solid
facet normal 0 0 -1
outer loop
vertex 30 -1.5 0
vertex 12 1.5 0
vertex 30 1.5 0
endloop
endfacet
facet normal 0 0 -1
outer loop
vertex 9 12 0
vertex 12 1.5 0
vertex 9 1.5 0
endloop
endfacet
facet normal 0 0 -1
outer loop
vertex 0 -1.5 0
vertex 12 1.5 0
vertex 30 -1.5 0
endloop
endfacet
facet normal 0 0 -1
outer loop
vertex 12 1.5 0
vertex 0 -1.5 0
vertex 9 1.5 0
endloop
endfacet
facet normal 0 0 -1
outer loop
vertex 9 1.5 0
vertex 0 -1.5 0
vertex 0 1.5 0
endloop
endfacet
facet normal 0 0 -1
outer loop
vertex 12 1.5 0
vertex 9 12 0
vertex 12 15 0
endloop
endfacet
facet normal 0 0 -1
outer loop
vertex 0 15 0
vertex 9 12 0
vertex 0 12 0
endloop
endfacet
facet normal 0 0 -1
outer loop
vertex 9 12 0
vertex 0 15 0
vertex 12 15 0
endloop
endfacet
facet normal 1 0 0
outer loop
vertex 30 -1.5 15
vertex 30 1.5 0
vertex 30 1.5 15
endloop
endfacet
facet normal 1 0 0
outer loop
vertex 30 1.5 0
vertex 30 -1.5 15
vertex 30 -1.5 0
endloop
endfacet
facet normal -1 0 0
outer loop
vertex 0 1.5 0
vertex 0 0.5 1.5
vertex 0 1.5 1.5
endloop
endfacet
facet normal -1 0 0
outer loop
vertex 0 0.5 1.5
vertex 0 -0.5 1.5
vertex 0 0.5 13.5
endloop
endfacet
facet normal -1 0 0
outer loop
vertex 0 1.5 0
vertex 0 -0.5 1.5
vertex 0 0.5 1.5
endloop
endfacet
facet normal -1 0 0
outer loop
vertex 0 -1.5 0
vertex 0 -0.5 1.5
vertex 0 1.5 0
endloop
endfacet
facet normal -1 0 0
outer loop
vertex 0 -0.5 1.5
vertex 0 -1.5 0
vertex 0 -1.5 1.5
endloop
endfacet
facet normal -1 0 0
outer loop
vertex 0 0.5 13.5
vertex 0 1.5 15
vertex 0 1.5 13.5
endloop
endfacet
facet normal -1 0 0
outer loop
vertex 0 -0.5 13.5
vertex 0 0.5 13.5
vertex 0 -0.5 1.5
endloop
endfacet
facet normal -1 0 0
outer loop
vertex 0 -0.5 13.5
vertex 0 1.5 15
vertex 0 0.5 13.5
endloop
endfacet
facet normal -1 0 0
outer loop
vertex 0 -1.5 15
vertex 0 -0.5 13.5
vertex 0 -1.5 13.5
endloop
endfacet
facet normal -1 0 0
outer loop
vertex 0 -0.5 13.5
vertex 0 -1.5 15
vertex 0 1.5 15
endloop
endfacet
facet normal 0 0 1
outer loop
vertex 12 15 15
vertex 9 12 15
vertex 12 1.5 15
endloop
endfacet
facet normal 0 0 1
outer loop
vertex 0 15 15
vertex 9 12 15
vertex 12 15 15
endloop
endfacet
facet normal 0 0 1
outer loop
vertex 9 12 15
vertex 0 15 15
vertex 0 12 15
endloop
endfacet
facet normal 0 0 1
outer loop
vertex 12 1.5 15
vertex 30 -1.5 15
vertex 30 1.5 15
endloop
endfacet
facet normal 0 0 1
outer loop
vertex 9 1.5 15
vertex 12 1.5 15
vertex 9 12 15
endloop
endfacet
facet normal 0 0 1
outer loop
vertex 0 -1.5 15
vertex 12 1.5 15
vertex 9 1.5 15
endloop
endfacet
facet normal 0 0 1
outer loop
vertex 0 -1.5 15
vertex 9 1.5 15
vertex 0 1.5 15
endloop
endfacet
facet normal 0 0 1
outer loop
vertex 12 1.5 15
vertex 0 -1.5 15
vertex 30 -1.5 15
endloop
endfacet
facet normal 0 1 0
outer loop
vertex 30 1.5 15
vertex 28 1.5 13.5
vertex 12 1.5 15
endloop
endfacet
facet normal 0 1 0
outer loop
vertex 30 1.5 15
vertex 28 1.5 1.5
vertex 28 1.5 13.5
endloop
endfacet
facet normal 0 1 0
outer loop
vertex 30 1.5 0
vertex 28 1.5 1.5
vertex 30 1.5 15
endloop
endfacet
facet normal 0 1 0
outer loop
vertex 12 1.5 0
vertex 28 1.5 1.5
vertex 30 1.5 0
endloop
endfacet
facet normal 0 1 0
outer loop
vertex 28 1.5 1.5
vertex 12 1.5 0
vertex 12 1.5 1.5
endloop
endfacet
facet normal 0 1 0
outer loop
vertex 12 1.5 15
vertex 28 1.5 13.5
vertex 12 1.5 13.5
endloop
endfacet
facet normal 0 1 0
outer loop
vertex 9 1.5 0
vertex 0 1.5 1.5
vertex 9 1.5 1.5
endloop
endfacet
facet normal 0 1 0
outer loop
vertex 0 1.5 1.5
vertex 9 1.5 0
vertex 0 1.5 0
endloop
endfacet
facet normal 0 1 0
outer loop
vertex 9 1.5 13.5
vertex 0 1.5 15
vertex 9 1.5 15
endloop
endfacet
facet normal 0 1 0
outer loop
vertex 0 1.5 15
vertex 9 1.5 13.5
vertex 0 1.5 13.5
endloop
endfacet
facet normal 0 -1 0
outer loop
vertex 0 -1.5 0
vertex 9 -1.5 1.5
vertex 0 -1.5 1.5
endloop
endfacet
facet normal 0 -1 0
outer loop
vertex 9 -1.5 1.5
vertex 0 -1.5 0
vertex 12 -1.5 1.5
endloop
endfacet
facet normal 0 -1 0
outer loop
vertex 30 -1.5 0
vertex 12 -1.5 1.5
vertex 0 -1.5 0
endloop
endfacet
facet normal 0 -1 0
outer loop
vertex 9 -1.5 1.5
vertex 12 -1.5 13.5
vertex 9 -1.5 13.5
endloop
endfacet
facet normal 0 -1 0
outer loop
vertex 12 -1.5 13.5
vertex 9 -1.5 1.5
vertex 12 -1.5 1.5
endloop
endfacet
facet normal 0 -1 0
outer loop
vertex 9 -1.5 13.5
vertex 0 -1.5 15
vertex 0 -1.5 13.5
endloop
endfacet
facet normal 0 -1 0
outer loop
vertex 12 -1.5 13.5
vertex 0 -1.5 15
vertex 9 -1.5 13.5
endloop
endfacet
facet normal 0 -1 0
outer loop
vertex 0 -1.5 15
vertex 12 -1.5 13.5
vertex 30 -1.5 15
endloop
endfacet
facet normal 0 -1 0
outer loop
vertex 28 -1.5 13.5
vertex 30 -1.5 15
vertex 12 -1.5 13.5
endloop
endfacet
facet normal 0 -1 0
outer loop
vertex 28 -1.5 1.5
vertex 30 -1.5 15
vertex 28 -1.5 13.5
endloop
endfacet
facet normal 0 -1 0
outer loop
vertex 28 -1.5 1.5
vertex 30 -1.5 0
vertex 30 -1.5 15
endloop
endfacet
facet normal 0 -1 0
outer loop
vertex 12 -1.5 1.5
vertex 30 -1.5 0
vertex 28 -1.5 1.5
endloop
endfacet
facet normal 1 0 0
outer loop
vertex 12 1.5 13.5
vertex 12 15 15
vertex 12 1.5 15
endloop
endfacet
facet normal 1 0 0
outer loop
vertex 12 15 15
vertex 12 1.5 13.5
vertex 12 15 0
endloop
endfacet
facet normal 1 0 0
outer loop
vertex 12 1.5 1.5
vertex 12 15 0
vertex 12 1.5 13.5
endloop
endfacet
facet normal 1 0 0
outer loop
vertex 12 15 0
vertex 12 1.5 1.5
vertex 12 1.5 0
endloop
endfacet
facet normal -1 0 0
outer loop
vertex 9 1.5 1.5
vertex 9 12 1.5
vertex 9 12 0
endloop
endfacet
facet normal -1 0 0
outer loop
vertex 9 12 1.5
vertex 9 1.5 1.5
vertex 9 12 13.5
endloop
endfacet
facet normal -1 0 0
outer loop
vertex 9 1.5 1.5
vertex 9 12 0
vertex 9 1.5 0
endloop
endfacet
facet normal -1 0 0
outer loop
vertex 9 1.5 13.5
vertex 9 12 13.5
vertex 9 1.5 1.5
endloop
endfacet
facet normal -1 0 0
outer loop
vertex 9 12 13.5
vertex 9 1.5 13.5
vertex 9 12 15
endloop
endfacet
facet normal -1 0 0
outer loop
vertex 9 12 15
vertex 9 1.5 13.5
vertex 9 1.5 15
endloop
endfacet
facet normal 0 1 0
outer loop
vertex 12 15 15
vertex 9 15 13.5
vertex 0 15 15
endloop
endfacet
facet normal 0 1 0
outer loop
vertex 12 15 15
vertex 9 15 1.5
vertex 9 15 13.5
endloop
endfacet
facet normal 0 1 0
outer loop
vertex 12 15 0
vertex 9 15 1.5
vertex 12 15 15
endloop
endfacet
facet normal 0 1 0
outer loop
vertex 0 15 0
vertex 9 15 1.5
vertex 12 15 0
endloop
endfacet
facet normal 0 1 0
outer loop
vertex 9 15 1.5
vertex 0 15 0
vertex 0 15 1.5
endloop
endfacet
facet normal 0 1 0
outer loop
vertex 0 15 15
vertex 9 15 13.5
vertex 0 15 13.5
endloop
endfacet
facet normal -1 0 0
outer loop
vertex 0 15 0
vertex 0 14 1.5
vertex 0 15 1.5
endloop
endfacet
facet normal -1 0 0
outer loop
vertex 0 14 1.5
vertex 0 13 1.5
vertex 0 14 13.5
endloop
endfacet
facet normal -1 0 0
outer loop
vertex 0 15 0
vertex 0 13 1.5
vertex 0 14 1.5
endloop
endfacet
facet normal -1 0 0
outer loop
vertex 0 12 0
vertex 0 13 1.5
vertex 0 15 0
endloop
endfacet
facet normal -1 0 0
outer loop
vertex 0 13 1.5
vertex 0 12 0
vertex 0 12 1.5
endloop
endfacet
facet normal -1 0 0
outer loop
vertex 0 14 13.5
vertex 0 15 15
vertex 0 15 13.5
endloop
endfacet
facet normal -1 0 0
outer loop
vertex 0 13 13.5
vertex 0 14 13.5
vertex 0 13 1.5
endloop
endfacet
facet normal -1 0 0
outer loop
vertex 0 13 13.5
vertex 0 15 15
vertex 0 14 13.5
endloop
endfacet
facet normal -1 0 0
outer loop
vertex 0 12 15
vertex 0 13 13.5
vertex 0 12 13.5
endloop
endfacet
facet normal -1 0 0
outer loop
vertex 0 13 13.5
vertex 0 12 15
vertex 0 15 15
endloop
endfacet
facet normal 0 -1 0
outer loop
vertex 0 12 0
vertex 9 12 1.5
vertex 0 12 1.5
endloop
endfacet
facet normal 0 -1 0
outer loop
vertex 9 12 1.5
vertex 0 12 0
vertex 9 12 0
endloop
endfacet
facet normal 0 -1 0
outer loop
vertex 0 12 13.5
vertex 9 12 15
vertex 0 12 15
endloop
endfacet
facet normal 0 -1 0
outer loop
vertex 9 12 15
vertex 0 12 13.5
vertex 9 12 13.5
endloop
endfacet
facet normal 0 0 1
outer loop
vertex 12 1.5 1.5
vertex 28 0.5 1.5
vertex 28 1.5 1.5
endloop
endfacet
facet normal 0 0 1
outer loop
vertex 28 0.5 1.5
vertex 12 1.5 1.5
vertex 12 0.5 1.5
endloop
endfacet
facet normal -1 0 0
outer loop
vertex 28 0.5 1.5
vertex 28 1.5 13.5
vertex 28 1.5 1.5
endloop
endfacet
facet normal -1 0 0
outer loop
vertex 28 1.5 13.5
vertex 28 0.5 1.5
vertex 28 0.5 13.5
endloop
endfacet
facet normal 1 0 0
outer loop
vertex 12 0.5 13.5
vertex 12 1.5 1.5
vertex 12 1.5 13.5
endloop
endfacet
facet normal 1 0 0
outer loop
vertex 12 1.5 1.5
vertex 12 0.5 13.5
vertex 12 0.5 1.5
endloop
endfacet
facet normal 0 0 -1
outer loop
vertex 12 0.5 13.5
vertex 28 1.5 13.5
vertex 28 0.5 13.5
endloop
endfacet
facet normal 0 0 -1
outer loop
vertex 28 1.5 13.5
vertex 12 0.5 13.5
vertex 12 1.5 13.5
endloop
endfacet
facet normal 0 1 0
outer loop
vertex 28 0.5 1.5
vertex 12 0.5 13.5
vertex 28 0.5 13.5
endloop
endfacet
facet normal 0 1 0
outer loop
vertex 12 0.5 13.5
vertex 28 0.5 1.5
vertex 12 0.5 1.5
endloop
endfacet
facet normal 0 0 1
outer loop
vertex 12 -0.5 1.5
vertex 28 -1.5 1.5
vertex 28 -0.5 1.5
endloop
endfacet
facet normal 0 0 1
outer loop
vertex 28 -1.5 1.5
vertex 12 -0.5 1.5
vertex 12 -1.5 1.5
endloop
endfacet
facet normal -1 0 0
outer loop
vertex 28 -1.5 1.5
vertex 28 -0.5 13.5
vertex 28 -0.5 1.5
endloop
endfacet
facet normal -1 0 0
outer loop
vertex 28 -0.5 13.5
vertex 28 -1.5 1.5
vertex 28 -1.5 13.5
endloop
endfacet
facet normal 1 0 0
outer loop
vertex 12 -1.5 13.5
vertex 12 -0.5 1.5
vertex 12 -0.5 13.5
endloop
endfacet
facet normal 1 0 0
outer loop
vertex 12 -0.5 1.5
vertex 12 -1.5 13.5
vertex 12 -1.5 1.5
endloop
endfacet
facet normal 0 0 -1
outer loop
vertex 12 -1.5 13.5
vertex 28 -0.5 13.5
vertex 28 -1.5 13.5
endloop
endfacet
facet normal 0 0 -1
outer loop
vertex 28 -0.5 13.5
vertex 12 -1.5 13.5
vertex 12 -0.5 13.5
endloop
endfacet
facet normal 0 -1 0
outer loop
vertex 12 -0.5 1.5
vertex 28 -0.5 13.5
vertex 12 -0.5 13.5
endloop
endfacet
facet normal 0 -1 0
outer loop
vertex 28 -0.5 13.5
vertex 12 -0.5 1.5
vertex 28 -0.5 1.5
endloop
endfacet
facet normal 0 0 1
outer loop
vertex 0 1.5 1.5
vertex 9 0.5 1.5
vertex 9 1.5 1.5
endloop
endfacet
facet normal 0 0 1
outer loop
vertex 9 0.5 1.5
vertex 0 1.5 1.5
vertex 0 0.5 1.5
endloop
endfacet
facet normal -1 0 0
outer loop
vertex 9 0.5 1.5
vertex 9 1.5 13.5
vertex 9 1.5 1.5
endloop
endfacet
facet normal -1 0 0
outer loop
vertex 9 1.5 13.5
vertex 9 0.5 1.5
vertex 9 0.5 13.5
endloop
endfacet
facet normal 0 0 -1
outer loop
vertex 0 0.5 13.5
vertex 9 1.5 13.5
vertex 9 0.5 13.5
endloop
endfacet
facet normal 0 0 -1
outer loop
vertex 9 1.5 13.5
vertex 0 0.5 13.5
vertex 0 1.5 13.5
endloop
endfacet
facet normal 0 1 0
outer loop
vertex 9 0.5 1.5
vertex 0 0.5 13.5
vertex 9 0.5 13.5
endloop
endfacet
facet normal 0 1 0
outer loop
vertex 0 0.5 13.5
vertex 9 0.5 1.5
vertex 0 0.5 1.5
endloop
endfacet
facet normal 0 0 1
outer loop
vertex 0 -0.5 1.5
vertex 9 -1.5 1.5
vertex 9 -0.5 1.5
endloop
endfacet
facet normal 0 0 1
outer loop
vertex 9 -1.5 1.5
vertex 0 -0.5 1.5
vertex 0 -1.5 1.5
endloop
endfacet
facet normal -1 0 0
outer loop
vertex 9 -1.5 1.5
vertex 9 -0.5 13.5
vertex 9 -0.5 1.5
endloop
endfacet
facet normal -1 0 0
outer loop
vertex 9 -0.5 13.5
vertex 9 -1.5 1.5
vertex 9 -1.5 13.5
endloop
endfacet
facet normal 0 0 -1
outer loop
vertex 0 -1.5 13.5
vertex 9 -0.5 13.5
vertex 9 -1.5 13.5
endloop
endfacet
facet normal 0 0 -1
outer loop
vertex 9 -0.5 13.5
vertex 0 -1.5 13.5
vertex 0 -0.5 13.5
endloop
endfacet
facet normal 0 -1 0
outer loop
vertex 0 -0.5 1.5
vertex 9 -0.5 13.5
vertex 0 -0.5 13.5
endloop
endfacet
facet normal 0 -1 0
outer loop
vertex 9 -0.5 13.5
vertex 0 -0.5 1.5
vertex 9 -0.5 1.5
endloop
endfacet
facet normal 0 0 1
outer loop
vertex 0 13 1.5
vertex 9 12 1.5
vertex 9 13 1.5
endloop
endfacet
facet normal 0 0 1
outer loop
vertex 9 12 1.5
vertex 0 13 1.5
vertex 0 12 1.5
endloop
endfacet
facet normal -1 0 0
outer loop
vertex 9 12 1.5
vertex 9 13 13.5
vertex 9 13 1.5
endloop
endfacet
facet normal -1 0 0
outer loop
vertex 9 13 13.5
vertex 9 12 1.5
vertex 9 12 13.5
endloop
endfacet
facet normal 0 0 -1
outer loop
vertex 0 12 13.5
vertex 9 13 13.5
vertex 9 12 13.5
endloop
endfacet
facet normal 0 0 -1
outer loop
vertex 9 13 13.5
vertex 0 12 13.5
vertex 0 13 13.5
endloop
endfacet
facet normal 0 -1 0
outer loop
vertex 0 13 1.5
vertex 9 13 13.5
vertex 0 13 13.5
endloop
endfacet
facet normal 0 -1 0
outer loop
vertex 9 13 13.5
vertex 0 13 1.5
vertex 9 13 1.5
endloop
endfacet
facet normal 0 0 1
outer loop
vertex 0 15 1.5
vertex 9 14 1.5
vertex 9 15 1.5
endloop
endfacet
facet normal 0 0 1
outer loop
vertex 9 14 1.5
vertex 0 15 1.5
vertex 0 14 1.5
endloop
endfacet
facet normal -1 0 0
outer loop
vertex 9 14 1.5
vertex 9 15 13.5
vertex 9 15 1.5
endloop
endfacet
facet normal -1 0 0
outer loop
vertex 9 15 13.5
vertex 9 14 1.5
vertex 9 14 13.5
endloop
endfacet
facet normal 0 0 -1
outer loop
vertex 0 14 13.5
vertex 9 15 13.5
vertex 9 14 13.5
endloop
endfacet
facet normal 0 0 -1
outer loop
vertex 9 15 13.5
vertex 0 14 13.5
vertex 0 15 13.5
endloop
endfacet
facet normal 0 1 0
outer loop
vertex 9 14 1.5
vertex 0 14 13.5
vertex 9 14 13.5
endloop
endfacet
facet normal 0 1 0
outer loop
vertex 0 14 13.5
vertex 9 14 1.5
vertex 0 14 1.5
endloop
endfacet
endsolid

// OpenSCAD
translate([0,0,7.5]) rotate([0,90,0]) difference()
{
	union()
	{
		translate([0,0,15]) cube([15,3,30], center=true);
		translate([0,7.5,10.5]) cube([15,15,3],center=true);
		translate([0,13.5,6]) cube([15,3,12], center=true);
	}
	translate([0, 1,20]) cube([12,1,16], center=true);
	translate([0,-1,20]) cube([12,1,16], center=true);

	translate([0,1,4.5]) cube([12,1,9], center=true);
	translate([0,-1,4.5]) cube([12,1,9], center=true);

	translate([0, 12.5,4.5]) cube([12,1,9], center=true);
	translate([0, 14.5,4.5]) cube([12,1,9], center=true);
}
